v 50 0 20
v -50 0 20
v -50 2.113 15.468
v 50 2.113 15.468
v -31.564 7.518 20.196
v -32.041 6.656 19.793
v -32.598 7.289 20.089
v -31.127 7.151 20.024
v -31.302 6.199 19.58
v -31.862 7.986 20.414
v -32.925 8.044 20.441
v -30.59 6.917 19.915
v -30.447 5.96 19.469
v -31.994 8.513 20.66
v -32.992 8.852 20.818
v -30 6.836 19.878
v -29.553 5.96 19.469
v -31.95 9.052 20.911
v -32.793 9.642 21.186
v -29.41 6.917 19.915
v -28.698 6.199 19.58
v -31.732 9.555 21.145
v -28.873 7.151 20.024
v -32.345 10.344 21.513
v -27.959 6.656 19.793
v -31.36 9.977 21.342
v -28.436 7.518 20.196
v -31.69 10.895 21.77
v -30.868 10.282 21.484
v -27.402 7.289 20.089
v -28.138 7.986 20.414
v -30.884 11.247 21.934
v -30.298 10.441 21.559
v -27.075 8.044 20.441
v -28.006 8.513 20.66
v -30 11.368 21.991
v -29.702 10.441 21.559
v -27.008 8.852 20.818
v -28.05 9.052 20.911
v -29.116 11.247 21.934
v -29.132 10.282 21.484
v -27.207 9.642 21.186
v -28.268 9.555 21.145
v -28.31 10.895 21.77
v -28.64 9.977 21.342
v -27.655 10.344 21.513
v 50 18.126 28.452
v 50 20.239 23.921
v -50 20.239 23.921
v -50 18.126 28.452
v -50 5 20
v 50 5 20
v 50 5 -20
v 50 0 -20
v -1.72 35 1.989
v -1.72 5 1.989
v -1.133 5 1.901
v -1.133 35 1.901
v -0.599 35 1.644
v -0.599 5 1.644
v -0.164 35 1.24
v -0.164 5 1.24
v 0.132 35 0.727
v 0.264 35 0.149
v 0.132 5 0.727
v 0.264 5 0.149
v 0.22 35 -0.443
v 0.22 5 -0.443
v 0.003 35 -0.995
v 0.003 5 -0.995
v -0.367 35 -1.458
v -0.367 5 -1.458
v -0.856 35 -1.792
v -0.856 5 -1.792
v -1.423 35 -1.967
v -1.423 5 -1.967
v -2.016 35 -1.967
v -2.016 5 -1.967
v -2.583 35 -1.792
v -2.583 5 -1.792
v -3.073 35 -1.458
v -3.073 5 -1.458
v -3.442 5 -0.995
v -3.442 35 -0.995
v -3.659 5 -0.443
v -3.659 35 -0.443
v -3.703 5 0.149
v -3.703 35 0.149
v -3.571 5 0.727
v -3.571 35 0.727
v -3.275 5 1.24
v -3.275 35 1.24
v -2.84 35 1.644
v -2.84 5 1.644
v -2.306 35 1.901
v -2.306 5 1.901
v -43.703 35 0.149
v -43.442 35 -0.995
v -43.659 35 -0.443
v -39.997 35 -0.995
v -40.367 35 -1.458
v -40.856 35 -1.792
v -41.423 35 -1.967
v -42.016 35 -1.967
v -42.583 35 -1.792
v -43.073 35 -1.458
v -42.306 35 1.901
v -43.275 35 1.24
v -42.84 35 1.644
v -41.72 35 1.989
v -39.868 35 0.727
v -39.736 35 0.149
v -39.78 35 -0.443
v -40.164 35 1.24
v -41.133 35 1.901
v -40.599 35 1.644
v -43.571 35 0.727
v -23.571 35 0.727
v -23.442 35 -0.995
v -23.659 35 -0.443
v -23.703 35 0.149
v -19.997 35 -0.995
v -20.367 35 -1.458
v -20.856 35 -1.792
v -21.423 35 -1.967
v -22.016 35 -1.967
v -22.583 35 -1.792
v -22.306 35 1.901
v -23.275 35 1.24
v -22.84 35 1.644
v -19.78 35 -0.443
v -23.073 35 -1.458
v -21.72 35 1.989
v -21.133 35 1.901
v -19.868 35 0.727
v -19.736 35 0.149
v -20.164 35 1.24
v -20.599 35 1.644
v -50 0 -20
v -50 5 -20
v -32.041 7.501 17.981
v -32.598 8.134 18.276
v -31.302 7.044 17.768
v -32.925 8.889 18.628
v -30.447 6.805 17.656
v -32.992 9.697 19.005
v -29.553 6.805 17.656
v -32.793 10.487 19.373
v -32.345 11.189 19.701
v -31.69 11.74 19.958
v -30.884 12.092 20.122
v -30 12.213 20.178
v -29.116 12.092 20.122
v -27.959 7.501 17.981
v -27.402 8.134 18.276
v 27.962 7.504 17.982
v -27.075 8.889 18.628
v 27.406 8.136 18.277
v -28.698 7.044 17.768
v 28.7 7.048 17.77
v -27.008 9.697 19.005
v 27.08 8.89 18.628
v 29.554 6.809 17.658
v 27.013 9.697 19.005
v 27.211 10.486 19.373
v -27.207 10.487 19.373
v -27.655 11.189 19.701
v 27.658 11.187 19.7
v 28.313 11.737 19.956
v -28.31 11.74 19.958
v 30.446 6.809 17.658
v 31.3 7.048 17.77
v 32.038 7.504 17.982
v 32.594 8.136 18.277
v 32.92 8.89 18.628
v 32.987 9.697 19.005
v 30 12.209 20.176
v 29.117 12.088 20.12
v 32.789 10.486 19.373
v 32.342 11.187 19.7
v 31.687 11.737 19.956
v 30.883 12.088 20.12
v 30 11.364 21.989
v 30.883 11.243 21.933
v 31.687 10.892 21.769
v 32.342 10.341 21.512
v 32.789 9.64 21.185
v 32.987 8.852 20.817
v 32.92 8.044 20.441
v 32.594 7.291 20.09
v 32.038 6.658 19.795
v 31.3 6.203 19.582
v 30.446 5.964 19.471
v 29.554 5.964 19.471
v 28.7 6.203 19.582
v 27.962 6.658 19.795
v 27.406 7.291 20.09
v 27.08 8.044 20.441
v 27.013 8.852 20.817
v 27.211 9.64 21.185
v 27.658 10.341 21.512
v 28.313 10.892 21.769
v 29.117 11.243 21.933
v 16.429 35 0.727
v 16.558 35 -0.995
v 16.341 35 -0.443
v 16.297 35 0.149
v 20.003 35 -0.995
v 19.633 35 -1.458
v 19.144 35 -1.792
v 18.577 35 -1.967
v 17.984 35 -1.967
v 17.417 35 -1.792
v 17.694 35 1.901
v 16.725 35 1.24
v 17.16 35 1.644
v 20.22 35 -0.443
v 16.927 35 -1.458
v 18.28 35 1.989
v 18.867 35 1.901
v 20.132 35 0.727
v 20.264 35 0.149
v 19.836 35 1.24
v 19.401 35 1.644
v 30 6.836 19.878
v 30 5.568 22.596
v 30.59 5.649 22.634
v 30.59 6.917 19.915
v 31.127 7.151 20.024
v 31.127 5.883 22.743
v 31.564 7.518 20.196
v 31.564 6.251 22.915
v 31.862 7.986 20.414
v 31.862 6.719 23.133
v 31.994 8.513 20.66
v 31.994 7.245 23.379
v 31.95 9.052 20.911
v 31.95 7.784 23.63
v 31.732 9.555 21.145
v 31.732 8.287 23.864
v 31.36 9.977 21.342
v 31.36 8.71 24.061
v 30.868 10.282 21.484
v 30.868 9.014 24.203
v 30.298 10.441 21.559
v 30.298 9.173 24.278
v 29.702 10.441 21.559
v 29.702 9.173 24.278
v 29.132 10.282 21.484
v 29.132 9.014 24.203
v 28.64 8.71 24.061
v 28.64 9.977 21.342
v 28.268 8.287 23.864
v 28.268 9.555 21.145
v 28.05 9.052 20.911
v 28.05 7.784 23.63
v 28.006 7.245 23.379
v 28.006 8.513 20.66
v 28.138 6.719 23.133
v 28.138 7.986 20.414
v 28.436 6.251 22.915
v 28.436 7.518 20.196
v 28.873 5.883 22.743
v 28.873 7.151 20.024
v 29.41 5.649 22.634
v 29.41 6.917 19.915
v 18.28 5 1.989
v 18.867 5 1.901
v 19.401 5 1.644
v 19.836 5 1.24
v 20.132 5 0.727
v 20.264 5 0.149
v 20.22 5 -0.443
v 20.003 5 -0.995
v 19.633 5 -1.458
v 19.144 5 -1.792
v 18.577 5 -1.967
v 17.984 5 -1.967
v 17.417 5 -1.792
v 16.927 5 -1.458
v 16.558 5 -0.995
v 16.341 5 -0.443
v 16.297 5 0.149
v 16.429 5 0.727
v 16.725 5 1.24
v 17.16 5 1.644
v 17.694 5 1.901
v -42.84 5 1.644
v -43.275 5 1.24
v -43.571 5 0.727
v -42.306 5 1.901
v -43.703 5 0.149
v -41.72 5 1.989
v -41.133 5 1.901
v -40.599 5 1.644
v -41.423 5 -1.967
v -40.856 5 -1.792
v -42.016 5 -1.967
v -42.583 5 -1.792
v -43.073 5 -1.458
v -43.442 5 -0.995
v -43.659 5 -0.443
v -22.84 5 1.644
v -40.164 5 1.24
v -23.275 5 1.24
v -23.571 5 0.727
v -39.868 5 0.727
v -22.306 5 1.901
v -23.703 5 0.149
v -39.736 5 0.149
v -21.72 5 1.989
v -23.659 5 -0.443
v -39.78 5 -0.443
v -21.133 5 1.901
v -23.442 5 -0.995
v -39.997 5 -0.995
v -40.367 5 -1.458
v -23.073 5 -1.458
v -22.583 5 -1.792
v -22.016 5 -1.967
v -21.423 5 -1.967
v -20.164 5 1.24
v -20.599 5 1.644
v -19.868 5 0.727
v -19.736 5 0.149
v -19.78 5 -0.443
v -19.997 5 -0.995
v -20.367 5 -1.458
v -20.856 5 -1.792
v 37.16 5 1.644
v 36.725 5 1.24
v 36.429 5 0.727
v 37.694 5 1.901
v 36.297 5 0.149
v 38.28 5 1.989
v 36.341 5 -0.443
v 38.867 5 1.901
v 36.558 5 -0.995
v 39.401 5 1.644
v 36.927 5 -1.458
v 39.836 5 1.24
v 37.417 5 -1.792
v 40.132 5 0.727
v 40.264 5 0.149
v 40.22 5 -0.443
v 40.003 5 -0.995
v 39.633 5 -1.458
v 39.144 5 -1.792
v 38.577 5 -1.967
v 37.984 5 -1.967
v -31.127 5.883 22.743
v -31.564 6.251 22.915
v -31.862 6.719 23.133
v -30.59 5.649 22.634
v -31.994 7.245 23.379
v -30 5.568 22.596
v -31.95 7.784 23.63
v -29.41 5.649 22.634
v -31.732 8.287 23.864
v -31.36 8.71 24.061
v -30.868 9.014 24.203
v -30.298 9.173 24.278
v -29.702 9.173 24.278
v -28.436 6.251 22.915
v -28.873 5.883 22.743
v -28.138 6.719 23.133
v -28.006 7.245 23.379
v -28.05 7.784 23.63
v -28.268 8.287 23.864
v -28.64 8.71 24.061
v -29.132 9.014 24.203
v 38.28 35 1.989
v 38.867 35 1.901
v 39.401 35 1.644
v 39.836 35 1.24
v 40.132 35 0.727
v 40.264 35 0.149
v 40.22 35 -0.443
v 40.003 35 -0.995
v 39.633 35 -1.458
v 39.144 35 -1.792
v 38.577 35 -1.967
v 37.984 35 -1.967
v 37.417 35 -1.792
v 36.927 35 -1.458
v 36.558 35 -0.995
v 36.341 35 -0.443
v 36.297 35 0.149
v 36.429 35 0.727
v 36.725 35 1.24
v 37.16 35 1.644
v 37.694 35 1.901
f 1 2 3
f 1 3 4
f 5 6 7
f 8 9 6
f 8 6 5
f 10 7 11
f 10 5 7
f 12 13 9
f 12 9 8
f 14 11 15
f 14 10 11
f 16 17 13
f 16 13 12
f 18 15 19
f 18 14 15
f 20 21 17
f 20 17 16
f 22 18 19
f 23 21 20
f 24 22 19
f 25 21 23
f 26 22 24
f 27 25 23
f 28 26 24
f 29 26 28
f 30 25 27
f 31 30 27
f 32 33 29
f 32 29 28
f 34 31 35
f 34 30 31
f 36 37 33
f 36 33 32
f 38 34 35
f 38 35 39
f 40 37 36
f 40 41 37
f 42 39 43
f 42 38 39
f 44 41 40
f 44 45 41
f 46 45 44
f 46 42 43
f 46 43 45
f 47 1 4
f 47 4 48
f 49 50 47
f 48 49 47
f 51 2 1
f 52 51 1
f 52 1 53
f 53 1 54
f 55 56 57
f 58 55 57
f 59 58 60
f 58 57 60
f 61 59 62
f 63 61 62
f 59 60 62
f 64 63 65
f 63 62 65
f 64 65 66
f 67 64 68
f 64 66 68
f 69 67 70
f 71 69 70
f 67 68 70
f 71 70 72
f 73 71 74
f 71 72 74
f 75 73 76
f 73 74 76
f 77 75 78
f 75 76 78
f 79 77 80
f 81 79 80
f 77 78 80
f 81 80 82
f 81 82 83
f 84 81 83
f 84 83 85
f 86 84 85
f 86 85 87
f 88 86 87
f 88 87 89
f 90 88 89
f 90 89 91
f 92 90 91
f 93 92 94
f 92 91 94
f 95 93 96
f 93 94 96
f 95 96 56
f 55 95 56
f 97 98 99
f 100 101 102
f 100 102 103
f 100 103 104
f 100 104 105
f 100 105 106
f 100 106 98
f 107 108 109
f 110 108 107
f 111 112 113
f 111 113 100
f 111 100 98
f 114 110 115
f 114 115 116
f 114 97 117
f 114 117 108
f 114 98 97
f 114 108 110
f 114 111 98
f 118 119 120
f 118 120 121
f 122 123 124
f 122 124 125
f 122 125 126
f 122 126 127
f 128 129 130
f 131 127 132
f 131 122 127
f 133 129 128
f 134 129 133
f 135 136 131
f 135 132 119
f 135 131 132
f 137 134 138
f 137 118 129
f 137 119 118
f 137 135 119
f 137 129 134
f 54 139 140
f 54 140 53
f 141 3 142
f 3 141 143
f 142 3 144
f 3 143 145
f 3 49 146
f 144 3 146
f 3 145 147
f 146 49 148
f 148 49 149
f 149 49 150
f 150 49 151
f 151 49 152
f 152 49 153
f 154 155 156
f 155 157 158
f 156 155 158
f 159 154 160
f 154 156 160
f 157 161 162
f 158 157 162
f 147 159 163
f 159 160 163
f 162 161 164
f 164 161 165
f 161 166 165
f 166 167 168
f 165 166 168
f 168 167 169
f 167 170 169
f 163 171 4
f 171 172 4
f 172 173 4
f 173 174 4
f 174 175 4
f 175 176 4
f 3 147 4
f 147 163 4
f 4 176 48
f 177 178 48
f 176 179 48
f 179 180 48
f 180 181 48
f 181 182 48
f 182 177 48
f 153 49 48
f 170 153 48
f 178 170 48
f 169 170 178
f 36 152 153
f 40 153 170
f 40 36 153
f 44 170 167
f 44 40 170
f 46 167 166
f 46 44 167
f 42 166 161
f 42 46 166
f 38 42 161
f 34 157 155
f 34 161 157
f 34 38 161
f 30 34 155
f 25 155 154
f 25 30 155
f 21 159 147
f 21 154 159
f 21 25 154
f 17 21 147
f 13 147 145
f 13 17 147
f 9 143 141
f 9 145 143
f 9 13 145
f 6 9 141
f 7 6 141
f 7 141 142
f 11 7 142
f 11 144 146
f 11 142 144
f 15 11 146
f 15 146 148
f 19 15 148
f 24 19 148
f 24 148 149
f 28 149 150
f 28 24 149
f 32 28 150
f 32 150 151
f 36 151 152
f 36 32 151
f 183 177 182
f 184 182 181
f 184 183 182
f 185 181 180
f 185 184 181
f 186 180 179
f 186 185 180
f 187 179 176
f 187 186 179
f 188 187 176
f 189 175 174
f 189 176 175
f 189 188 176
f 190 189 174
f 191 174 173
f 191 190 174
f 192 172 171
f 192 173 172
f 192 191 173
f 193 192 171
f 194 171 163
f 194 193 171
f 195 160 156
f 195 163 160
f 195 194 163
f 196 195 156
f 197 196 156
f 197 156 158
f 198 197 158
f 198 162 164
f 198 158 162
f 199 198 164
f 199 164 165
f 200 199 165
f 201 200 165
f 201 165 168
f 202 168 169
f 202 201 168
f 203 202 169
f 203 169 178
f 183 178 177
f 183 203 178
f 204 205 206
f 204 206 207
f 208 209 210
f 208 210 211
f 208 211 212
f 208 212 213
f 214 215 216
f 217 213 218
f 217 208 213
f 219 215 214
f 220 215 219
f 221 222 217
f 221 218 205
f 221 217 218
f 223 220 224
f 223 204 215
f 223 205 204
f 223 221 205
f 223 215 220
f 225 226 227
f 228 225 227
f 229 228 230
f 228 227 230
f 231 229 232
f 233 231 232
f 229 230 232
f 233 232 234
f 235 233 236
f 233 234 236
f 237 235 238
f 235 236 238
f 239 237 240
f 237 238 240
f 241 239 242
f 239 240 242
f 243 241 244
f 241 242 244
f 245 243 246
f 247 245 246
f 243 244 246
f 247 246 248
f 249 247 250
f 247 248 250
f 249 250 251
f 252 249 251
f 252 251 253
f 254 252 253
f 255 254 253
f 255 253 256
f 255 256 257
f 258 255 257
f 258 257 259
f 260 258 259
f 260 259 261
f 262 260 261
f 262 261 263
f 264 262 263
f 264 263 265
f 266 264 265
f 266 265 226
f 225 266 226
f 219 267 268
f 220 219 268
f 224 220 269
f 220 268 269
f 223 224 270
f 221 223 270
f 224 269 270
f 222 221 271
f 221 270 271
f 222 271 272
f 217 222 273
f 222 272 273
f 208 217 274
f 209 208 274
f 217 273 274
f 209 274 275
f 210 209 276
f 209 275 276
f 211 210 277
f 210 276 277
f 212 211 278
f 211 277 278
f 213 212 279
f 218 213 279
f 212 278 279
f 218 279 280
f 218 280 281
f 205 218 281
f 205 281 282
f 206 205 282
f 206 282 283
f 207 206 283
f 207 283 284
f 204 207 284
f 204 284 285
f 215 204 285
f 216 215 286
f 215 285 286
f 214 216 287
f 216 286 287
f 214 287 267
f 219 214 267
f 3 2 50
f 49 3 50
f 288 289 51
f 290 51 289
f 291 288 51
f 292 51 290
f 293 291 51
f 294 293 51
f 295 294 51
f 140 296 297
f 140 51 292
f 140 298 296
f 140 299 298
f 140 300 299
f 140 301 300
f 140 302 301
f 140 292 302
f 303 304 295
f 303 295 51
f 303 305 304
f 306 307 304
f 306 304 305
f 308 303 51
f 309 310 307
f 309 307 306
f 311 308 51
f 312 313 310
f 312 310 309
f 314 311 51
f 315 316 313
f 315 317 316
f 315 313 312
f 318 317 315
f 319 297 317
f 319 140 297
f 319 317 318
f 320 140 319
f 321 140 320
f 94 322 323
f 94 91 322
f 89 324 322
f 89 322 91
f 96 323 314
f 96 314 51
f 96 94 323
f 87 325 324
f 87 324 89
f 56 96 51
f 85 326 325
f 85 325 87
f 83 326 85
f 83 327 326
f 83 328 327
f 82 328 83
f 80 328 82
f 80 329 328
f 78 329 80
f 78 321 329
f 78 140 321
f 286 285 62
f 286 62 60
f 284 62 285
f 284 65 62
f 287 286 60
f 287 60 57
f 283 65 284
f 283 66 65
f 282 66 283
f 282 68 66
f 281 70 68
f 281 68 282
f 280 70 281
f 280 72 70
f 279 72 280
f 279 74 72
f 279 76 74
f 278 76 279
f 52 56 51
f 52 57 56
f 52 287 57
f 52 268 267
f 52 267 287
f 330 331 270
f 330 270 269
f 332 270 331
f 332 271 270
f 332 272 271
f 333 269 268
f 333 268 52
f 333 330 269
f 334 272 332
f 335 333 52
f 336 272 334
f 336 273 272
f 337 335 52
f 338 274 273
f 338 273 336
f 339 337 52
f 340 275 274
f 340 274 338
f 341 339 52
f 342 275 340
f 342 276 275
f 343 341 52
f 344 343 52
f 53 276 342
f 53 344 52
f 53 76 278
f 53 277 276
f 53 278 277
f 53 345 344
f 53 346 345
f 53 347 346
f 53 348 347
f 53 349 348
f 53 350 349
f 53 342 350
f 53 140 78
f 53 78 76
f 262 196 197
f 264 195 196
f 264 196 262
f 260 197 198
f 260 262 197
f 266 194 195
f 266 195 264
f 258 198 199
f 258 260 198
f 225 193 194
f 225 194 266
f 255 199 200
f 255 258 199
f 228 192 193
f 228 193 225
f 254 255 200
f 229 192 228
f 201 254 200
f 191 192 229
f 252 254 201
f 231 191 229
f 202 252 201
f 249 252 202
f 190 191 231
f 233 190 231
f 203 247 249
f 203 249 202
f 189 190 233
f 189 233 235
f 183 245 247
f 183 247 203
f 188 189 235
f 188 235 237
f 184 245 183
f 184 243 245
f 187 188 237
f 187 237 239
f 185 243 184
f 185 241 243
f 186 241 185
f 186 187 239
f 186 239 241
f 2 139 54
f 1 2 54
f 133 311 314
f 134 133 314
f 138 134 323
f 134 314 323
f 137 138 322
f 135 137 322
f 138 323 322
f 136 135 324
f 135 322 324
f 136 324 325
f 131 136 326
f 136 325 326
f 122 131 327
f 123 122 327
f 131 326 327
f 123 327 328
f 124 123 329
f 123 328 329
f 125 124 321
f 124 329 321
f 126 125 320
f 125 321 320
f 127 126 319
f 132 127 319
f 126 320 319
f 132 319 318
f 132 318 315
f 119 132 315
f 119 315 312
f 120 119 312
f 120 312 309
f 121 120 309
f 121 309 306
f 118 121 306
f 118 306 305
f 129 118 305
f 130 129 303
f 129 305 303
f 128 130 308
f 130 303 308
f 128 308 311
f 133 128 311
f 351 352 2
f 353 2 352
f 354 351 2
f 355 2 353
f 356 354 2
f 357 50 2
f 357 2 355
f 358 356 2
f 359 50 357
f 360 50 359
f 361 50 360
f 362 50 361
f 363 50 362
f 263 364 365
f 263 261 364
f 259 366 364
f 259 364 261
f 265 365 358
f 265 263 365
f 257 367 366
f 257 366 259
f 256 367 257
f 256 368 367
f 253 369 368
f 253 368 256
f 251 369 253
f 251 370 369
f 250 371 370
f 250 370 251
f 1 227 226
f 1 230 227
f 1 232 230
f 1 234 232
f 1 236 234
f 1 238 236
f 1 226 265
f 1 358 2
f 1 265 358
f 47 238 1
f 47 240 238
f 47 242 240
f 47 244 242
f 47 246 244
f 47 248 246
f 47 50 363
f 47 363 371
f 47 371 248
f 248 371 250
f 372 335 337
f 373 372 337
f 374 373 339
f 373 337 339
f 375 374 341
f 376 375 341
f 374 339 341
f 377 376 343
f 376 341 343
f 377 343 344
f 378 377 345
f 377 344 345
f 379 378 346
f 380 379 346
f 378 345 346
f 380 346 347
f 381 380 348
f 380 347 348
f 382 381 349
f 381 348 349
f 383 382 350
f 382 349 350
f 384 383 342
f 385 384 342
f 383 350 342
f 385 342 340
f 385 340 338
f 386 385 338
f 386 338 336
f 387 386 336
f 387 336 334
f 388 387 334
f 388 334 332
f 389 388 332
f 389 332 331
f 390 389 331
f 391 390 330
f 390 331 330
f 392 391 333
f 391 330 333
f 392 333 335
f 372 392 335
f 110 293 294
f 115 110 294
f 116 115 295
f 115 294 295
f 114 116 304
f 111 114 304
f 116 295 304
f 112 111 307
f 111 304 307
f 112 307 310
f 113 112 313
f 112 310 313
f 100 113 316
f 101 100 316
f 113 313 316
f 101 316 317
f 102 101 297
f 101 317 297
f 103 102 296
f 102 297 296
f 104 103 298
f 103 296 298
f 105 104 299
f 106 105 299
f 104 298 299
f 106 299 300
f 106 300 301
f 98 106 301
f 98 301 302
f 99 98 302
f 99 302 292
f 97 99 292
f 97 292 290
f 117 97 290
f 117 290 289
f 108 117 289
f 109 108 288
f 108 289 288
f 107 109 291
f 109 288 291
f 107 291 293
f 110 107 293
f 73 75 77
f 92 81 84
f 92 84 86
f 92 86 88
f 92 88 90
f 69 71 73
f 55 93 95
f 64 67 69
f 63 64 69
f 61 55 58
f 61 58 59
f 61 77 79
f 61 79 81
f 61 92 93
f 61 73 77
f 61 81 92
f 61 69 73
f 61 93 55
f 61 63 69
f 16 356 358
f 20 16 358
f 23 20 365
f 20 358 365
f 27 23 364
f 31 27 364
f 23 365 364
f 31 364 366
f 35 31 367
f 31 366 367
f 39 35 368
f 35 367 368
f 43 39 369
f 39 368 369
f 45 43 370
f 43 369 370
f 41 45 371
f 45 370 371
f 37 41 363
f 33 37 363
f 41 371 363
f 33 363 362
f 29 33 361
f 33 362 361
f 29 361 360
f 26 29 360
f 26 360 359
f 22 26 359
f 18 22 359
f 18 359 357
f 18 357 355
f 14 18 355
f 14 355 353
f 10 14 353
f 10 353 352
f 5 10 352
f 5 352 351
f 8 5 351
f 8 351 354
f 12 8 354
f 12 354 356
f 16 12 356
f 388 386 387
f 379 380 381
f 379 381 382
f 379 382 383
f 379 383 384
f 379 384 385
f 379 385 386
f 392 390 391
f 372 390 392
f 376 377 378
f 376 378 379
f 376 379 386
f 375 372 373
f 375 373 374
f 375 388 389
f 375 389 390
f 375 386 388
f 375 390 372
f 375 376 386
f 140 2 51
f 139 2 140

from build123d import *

# Parameters (mm, degrees)
ESQUISSE1_W                  = 100
ESQUISSE1_H                  = 40
BOSS_EXTRU_1_DEPTH           = 5
ESQUISSE3_W                  = 100
ESQUISSE3_H                  = 20
BOSS_EXTRU_2_DEPTH           = 5
ESQUISSE4_R                  = 1.989208733
BOSS_EXTRU_3_DEPTH           = 30
ESQUISSE5_R                  = 2
ENL_V_MAT_EXTRU_1_DEPTH      = 10
ENL_V_MAT_EXTRU_2_DEPTH      = 72.843330724
ENL_V_MAT_EXTRU_2_DEPTH_BACK = 2
ESQUISSE6_R                  = 2.995599757
ESQUISSE6_R_2                = 3


with BuildPart() as part:
    # Esquisse1 → Boss.-Extru.1 (new body)
    with BuildSketch(Plane(origin=(0, 0, 0), x_dir=(1, 0, 0), z_dir=(0, 1, 0))):
        Rectangle(ESQUISSE1_W, ESQUISSE1_H)
    extrude(amount=BOSS_EXTRU_1_DEPTH)

    # Esquisse4 → Boss.-Extru.3 (add)
    with BuildSketch(Plane(origin=(0, 5, 0), x_dir=(1, 0, 0), z_dir=(0, 1, 0))):
        with Locations(Location((38.280473345, 0, 0), (0, 0, 270))):
            Circle(ESQUISSE4_R)
        with Locations(Location((18.280473345, 0, 0), (0, 0, 270))):
            Circle(ESQUISSE4_R)
        with Locations(Location((-1.719526655, 0, 0), (0, 0, 270))):
            Circle(ESQUISSE4_R)
        with Locations(Location((-21.719526655, 0, 0), (0, 0, 270))):
            Circle(ESQUISSE4_R)
        with Locations(Location((-41.719526655, 0, 0), (0, 0, 270))):
            Circle(ESQUISSE4_R)
    extrude(amount=BOSS_EXTRU_3_DEPTH)


with BuildPart() as body_2:
    # Esquisse3 → Boss.-Extru.2 (new body)
    with BuildSketch(Plane(origin=(0, -7.660444431, 16.427876097), x_dir=(1, 0, 0), z_dir=(0, -0.4226182617407033, 0.9063077870366482))):
        with Locations((0, 18.452365235)):
            Rectangle(ESQUISSE3_W, ESQUISSE3_H)
    extrude(amount=-BOSS_EXTRU_2_DEPTH)

    # Esquisse5 → Enlèv. mat.-Extru.1 (cut)
    with BuildSketch(Plane(origin=(0, -7.660444431, 16.427876097), x_dir=(1, 0, 0), z_dir=(0, -0.4226182617407035, 0.906307787036648))):
        with Locations(Location((-30, 16.596133741, 0), (0, 0, 270))):
            Circle(ESQUISSE5_R)
        with Locations(Location((30, 16.596133741, 0), (0, 0, 270))):
            Circle(ESQUISSE5_R)
    extrude(amount=-ENL_V_MAT_EXTRU_1_DEPTH, mode=Mode.SUBTRACT)

    # Esquisse6 → Enlèv. mat.-Extru.2 (cut, two sides: drawn at the far end of the back side and taken through both)
    with BuildSketch(Plane(origin=(0, -5.547353122, 11.896337162), x_dir=(-1, 0, 0), z_dir=(0, 0.4226182617407035, -0.906307787036648)).offset(-ENL_V_MAT_EXTRU_2_DEPTH_BACK)):
        with Locations(Location((-30, 16.596133741, 0), (0, 0, 90))):
            Circle(ESQUISSE6_R)
        with Locations(Location((30, 16.596133741, 0), (0, 0, 90))):
            Circle(ESQUISSE6_R_2)
    extrude(amount=ENL_V_MAT_EXTRU_2_DEPTH + ENL_V_MAT_EXTRU_2_DEPTH_BACK, mode=Mode.SUBTRACT)


solid = Compound([part.part, body_2.part])
